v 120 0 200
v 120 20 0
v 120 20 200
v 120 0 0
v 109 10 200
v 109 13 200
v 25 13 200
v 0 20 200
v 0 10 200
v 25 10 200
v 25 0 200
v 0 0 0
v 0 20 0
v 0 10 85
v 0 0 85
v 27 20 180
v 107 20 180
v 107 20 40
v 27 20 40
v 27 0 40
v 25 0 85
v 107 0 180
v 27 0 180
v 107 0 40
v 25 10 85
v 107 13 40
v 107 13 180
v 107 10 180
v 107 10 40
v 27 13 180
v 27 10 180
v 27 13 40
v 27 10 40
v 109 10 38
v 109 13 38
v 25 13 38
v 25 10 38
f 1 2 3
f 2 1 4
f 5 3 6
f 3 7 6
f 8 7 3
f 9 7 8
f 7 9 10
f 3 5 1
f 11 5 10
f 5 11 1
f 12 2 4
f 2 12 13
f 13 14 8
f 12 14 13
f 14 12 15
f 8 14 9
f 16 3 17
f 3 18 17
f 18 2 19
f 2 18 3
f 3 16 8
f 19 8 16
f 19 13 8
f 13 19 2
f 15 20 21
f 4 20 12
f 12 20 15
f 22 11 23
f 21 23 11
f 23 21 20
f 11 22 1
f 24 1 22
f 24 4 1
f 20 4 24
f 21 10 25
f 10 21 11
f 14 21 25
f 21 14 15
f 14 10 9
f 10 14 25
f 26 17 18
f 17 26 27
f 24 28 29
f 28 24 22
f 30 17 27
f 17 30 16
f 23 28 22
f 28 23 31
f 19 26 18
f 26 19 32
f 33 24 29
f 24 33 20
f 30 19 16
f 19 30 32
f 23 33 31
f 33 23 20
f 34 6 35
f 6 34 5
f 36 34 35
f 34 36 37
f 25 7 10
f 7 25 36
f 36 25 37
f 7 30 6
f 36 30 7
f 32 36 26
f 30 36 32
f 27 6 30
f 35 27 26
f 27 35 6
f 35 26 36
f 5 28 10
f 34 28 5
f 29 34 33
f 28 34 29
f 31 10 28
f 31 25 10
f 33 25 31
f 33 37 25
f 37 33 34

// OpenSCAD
BoxD=20;
BoxW=120;
BoxH=200;
cutH=85;
cutW=25;
cutD=10;
Edge=20;
xOpen=BoxW-(Edge*2);
zOpen=BoxH-(Edge*2);
xLid=xOpen+2;
yLid=2;
zLid=zOpen+2;


*translate([0,0,BoxD]) rotate([-90,0,0]);
difference()
{
  cube([BoxW,BoxD,BoxH]);
  translate([-5,-5,cutH]) cube([cutW+5,cutD+5,BoxH]);
  translate([Edge+7,-5,Edge*2]) cube([xOpen,BoxD+15,BoxH-Edge*3]);
  translate([Edge+5,(BoxD/2),(Edge*2)-2]) cube([xLid+2,yLid+1,BoxH+5]);
}
